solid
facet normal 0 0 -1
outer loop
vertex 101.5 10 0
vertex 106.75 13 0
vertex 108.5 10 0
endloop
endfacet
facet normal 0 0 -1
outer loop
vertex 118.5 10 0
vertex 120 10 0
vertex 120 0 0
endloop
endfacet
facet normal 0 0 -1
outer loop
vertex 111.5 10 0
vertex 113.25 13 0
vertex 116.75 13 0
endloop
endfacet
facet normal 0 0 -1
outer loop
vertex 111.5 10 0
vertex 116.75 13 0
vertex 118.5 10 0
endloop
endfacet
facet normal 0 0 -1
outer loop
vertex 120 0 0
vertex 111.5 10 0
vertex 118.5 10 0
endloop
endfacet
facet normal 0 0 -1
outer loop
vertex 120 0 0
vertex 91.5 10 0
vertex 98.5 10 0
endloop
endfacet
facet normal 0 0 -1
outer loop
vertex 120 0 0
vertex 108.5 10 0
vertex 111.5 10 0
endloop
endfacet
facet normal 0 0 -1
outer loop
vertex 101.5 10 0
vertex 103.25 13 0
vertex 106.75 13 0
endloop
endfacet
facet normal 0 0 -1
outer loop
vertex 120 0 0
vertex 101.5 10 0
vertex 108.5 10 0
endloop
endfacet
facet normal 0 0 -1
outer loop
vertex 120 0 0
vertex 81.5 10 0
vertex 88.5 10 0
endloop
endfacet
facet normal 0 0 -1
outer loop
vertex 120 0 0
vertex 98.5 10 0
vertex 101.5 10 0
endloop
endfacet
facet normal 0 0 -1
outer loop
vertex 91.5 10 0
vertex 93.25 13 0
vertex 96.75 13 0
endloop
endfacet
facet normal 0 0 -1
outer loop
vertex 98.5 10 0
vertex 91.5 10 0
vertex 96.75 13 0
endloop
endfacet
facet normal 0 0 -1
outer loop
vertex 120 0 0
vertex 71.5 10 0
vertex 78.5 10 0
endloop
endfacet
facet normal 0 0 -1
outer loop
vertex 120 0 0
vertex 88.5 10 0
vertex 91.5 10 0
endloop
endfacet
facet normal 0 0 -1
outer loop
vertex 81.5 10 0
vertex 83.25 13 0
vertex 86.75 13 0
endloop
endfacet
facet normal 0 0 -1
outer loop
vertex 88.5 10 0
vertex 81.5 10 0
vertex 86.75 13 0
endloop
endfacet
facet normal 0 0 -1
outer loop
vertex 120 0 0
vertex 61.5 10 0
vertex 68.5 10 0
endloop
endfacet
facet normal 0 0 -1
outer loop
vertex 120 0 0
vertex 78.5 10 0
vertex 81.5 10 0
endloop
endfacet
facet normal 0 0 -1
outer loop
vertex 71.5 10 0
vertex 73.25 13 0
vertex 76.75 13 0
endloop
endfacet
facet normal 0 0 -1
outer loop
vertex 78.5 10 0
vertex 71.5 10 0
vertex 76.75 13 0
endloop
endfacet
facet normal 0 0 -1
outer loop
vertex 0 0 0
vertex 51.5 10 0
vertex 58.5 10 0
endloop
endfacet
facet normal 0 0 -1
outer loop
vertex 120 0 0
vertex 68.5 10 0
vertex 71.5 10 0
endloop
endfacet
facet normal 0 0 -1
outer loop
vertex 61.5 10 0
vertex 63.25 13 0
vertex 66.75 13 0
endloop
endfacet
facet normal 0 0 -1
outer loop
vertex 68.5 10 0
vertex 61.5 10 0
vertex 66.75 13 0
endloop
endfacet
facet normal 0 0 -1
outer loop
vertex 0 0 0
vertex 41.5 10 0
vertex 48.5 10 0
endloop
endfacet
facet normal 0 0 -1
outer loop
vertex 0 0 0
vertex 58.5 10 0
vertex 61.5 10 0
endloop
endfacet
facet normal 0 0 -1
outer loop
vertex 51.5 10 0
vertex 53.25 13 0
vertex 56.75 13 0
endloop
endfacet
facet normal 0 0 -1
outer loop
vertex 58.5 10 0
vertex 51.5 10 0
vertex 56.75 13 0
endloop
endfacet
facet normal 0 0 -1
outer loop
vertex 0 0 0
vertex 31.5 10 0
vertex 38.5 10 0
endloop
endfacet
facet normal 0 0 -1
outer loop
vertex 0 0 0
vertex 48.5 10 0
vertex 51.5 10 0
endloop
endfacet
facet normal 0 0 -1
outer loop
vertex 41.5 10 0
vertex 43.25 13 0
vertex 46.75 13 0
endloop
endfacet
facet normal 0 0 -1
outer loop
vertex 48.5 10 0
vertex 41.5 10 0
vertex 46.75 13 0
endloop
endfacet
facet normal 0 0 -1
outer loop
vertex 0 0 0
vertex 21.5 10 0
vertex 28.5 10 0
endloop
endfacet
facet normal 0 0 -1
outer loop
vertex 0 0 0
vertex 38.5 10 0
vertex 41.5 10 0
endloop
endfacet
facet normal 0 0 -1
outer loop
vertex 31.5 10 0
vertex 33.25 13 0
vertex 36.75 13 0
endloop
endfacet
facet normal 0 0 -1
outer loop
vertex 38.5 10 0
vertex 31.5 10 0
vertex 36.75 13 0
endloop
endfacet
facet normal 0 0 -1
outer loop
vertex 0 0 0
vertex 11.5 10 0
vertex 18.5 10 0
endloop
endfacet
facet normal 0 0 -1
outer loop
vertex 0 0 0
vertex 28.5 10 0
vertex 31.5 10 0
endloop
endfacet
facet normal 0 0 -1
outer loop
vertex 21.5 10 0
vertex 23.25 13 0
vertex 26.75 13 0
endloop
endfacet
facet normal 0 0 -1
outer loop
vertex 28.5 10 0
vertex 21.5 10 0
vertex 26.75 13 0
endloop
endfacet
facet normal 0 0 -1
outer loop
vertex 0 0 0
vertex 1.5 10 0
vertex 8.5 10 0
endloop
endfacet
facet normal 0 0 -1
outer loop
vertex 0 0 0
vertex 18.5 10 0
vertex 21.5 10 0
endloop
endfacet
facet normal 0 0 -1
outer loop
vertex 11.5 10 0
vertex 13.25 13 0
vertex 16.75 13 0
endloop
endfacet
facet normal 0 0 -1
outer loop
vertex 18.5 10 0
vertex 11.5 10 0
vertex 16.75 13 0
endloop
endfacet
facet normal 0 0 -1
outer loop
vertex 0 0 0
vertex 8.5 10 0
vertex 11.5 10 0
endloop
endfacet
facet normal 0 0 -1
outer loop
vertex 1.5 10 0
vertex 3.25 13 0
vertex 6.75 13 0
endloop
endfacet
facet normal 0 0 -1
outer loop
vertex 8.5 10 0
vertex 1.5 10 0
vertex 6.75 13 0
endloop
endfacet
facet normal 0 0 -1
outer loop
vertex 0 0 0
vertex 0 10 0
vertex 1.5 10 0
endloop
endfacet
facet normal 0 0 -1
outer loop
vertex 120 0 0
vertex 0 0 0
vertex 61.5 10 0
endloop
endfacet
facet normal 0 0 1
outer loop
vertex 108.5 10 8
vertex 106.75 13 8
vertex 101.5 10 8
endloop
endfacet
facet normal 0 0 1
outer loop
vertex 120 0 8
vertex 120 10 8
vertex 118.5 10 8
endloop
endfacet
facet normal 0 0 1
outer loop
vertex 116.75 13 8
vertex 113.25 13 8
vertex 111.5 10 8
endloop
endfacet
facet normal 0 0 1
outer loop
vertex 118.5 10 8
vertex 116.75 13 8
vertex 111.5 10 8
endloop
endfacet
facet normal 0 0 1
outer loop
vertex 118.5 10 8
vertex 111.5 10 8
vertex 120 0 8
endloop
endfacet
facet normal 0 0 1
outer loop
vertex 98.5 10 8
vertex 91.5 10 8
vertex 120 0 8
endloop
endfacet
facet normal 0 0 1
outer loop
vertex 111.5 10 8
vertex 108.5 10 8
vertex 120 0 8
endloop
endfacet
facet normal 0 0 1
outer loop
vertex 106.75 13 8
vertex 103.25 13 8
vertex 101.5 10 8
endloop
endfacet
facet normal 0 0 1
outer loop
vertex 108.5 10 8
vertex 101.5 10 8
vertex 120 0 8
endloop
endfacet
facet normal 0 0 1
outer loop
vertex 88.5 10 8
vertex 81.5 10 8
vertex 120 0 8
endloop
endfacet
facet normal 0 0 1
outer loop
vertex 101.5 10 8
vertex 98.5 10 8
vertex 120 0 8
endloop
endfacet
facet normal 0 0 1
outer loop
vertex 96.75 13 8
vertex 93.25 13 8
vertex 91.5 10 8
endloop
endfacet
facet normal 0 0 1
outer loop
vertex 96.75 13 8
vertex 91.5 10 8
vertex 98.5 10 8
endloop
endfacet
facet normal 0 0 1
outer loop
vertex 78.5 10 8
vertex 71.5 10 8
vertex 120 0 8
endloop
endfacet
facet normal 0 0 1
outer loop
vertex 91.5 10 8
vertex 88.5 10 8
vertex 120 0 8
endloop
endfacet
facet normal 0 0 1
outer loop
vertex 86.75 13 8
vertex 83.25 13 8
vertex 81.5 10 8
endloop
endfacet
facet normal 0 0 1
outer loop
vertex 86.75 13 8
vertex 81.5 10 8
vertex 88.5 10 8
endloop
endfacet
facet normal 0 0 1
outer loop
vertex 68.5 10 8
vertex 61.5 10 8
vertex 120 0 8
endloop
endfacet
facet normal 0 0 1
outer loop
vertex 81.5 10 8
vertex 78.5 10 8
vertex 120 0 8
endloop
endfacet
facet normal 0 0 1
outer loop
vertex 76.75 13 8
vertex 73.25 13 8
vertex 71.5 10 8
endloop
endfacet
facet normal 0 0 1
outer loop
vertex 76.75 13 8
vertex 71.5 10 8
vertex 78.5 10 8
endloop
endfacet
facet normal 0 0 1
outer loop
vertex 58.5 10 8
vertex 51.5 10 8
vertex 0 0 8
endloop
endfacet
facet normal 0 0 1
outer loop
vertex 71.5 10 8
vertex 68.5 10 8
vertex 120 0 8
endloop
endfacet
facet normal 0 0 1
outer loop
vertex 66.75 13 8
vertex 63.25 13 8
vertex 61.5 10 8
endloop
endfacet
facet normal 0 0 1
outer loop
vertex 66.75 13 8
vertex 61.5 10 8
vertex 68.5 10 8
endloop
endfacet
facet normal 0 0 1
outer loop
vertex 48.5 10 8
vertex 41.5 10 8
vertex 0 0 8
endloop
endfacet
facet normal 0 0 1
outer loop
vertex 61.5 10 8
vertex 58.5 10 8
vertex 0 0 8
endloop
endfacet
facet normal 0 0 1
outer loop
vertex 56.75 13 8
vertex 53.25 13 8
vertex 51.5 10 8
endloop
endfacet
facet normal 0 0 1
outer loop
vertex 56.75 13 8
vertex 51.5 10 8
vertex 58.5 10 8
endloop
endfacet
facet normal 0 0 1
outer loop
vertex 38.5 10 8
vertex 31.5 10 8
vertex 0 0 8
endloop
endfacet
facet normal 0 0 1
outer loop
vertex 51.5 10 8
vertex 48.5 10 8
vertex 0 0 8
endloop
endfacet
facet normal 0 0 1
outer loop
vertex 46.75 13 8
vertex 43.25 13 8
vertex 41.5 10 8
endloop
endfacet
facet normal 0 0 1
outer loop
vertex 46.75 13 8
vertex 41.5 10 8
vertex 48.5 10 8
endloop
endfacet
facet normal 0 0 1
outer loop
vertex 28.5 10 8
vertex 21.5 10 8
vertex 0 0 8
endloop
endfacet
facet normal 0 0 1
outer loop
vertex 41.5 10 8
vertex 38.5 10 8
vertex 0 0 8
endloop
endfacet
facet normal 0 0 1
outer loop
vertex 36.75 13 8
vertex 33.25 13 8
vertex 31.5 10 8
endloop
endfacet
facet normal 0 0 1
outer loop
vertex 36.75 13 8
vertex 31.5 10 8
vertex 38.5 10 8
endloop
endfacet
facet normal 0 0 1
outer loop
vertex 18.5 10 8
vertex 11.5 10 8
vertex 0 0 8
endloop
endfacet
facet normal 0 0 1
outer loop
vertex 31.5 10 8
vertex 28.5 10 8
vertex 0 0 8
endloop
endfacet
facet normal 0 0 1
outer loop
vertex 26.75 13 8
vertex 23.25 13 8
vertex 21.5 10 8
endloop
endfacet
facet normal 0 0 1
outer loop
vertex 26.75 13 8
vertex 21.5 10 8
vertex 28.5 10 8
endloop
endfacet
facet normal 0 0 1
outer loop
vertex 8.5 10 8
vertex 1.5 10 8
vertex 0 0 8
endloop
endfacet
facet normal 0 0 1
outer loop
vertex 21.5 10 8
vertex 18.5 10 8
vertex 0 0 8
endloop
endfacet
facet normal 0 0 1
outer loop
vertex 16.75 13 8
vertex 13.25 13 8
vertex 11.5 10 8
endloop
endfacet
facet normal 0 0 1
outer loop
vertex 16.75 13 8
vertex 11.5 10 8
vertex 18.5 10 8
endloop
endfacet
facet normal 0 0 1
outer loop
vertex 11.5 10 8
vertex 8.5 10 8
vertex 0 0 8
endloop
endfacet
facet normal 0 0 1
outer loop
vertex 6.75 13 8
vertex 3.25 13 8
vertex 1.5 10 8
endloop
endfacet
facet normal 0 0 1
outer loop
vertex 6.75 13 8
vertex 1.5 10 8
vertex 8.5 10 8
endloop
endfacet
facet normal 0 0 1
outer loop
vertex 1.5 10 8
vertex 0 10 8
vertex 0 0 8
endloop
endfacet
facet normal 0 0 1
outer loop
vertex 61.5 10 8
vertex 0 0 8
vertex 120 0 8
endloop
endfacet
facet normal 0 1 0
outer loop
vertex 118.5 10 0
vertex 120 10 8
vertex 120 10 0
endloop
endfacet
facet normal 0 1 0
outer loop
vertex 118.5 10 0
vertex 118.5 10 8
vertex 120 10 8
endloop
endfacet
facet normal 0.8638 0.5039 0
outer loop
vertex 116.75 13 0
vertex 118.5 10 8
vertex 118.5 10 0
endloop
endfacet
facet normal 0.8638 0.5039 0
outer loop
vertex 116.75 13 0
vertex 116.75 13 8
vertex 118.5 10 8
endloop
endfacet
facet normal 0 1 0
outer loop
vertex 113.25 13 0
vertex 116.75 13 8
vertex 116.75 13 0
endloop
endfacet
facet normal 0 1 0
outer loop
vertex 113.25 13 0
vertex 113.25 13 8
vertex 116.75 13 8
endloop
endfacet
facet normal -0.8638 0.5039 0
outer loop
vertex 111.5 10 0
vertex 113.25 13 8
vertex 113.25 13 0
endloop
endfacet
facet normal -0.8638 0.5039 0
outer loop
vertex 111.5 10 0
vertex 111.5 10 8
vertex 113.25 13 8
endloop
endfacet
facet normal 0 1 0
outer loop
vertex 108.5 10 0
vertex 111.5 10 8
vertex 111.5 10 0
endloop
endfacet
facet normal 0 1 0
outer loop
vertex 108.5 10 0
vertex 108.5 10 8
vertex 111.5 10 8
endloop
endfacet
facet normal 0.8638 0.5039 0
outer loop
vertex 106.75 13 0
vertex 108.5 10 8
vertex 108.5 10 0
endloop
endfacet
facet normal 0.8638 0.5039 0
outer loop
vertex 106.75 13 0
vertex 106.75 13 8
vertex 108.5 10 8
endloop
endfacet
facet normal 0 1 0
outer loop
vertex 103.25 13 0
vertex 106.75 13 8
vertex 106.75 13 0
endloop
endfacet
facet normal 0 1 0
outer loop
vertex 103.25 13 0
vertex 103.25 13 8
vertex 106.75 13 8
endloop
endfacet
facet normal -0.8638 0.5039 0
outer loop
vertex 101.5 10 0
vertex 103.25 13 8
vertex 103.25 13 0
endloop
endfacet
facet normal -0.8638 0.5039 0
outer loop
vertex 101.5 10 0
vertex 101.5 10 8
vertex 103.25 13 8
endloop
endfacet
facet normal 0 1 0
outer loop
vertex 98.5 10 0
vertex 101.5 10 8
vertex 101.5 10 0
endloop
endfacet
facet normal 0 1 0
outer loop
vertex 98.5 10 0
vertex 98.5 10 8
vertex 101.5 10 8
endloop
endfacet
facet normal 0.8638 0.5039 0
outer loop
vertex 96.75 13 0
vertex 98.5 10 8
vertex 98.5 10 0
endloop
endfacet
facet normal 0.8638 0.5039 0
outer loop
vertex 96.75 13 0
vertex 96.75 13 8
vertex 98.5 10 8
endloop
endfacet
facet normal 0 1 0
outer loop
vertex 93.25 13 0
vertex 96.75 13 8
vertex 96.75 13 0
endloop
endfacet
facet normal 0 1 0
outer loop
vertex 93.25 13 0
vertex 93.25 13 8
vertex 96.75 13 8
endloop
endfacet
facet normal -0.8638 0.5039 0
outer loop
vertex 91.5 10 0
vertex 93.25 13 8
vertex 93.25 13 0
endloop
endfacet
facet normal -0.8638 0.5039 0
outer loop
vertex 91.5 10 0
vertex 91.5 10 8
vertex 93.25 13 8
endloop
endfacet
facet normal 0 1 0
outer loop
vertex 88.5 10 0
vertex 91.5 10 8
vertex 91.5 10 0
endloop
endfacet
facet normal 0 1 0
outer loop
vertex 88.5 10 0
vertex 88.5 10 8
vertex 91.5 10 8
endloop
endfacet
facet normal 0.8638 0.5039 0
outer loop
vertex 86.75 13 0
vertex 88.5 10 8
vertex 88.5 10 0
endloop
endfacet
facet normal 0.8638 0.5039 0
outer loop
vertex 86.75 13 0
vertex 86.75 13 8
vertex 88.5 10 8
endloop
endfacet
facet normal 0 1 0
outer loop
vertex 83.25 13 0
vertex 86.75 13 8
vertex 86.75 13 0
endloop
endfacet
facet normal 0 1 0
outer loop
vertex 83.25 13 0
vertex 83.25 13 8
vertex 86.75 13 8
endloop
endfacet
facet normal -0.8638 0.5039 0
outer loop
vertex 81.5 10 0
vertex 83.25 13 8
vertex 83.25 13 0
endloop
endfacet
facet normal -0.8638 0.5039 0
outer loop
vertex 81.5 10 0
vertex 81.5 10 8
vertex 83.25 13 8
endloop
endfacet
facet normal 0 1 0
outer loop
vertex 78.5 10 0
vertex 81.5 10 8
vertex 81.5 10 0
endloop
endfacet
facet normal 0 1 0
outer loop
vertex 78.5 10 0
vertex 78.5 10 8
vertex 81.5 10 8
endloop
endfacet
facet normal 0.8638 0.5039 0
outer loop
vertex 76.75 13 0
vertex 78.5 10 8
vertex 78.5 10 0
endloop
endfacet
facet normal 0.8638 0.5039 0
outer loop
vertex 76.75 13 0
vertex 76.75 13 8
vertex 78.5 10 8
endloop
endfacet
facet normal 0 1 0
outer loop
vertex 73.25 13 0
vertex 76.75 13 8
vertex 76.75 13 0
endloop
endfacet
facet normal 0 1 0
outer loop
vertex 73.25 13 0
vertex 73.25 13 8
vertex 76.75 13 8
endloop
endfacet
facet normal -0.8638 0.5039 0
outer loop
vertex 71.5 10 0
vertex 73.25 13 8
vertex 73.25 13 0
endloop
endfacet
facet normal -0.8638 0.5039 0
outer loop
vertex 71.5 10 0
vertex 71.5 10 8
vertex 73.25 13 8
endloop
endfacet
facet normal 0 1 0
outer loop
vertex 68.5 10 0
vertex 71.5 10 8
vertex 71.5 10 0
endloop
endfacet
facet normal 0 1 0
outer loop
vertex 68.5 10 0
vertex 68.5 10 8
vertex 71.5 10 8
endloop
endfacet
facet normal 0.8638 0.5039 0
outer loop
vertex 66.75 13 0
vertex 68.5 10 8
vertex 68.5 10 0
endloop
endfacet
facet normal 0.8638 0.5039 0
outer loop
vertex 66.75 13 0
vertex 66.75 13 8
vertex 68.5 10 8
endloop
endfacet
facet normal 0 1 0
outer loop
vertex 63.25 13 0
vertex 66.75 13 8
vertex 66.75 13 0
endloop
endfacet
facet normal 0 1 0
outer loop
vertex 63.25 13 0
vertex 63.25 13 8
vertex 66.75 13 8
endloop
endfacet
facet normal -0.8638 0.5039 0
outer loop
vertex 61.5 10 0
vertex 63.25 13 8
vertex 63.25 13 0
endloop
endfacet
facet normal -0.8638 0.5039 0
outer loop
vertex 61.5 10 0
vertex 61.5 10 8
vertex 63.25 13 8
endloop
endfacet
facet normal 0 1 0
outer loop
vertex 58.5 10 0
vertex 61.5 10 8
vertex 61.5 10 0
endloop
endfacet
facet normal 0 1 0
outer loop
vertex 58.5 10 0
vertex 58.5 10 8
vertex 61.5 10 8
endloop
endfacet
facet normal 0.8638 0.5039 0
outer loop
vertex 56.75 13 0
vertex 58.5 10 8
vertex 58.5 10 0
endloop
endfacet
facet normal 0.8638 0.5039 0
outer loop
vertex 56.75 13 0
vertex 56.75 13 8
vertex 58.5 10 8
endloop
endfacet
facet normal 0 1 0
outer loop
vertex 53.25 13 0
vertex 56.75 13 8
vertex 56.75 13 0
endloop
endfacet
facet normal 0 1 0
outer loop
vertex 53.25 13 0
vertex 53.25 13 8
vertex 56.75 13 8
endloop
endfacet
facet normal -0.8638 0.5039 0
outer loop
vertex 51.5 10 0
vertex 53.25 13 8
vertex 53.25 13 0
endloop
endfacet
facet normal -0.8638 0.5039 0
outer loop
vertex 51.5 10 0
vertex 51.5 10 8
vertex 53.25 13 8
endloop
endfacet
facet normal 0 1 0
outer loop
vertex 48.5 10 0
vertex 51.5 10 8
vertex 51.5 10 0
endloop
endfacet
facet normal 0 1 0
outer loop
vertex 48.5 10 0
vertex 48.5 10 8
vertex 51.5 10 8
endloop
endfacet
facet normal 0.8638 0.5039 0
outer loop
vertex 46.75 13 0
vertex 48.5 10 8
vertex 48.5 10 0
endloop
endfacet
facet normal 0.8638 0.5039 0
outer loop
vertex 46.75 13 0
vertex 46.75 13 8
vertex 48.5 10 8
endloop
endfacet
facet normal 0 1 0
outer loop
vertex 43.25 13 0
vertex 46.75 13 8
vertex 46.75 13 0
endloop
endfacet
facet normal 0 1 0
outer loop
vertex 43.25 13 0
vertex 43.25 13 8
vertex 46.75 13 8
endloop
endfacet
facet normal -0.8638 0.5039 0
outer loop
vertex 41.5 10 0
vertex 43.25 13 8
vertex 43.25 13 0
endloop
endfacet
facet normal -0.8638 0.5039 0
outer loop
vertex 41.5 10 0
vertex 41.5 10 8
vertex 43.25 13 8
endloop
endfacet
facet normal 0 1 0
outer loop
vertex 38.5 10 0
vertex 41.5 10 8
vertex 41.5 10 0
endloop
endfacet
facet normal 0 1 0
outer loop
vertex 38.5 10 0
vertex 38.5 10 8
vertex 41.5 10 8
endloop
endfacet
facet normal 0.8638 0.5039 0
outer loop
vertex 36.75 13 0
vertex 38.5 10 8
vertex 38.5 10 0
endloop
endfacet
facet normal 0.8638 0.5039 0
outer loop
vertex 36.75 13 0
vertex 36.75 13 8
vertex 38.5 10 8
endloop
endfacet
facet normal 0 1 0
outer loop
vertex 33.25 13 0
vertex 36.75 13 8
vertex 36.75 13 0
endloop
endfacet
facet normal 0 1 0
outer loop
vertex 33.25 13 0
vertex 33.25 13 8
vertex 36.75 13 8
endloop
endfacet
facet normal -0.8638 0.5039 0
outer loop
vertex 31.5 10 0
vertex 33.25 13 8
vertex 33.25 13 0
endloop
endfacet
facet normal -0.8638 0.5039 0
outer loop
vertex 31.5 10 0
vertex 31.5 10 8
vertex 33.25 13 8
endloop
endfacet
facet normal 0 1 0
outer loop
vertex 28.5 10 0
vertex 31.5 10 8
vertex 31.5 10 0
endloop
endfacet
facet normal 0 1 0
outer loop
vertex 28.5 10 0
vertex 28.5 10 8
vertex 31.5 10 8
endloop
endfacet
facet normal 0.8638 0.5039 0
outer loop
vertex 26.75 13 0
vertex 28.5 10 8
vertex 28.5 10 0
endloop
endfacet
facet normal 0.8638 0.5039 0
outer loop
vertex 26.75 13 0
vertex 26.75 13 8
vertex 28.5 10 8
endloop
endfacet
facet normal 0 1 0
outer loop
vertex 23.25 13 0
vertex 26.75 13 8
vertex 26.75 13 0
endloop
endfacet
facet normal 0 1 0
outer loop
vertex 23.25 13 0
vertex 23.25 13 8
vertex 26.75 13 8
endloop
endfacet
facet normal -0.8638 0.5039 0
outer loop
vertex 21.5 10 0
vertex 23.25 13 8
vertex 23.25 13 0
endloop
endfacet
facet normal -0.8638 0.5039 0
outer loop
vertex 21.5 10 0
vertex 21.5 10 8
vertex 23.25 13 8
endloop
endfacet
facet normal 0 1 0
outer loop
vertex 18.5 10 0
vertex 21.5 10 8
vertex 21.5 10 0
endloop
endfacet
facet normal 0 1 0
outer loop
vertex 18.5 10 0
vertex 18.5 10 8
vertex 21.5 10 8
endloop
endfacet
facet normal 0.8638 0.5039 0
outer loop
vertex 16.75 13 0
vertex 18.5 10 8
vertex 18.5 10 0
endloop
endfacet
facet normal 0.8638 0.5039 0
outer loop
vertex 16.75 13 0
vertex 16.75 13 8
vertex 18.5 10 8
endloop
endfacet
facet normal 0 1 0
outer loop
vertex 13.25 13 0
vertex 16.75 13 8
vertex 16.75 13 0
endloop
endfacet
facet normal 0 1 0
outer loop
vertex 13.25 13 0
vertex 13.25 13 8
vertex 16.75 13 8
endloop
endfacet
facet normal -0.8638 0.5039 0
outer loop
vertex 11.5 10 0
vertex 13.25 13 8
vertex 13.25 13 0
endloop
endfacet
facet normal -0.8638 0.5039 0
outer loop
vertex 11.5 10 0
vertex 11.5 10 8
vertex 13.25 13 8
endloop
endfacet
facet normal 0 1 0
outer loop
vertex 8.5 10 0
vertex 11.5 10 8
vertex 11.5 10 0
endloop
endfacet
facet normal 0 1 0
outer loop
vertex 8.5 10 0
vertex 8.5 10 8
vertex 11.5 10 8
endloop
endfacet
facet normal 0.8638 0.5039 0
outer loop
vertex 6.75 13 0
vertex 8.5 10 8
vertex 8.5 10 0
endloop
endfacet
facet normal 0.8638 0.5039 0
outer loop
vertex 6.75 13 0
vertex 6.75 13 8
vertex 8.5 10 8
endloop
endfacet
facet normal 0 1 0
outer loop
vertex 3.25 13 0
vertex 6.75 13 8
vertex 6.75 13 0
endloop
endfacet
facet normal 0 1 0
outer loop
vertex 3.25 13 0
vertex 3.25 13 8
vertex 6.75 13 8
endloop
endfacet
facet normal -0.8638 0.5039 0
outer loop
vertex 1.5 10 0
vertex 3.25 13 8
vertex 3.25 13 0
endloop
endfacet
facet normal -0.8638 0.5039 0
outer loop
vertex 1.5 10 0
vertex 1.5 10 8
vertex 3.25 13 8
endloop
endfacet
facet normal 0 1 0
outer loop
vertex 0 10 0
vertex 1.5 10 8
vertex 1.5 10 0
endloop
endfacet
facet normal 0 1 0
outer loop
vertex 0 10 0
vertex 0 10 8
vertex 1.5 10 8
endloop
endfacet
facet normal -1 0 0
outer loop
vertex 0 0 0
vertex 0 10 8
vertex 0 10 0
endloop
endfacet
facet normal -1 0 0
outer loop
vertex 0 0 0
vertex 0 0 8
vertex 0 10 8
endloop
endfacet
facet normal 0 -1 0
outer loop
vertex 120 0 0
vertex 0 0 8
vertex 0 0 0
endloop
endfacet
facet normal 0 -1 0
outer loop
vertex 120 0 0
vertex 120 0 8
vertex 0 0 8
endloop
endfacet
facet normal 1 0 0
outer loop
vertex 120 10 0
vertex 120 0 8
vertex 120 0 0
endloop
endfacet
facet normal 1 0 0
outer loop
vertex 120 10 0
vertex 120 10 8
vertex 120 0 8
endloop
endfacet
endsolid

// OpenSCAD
$fn = 32;

// ----------------------------------------------------------------------
// Gear rack: 12 teeth, pitch 10 mm
// ----------------------------------------------------------------------

// --- parameters (mm) ---
teeth = 12;               // number of teeth
pitch = 10;               // tooth pitch, X
root_w = 7;               // tooth width at the root
tip_w = 3.5;              // tooth width at the tip
base_h = 10;              // rack body height, Y
tooth_h = 3;              // tooth height above the body
plate_t = 8;              // rack width, Z (extrusion height)

rack_l = teeth * pitch;  // overall length
total_h = base_h + tooth_h;  // overall height

profile = [[0, 0], [120, 0], [120, 10], [118.5, 10], [116.75, 13], [113.25, 13], [111.5, 10], [108.5, 10], [106.75, 13], [103.25, 13], [101.5, 10], [98.5, 10], [96.75, 13], [93.25, 13], [91.5, 10], [88.5, 10], [86.75, 13], [83.25, 13], [81.5, 10], [78.5, 10], [76.75, 13], [73.25, 13], [71.5, 10], [68.5, 10], [66.75, 13], [63.25, 13], [61.5, 10], [58.5, 10], [56.75, 13], [53.25, 13], [51.5, 10], [48.5, 10], [46.75, 13], [43.25, 13], [41.5, 10], [38.5, 10], [36.75, 13], [33.25, 13], [31.5, 10], [28.5, 10], [26.75, 13], [23.25, 13], [21.5, 10], [18.5, 10], [16.75, 13], [13.25, 13], [11.5, 10], [8.5, 10], [6.75, 13], [3.25, 13], [1.5, 10], [0, 10]];  // primary outline, 52 points, counter clockwise

// --- the one profile operation ---
linear_extrude(height = plate_t) polygon(points = profile);
